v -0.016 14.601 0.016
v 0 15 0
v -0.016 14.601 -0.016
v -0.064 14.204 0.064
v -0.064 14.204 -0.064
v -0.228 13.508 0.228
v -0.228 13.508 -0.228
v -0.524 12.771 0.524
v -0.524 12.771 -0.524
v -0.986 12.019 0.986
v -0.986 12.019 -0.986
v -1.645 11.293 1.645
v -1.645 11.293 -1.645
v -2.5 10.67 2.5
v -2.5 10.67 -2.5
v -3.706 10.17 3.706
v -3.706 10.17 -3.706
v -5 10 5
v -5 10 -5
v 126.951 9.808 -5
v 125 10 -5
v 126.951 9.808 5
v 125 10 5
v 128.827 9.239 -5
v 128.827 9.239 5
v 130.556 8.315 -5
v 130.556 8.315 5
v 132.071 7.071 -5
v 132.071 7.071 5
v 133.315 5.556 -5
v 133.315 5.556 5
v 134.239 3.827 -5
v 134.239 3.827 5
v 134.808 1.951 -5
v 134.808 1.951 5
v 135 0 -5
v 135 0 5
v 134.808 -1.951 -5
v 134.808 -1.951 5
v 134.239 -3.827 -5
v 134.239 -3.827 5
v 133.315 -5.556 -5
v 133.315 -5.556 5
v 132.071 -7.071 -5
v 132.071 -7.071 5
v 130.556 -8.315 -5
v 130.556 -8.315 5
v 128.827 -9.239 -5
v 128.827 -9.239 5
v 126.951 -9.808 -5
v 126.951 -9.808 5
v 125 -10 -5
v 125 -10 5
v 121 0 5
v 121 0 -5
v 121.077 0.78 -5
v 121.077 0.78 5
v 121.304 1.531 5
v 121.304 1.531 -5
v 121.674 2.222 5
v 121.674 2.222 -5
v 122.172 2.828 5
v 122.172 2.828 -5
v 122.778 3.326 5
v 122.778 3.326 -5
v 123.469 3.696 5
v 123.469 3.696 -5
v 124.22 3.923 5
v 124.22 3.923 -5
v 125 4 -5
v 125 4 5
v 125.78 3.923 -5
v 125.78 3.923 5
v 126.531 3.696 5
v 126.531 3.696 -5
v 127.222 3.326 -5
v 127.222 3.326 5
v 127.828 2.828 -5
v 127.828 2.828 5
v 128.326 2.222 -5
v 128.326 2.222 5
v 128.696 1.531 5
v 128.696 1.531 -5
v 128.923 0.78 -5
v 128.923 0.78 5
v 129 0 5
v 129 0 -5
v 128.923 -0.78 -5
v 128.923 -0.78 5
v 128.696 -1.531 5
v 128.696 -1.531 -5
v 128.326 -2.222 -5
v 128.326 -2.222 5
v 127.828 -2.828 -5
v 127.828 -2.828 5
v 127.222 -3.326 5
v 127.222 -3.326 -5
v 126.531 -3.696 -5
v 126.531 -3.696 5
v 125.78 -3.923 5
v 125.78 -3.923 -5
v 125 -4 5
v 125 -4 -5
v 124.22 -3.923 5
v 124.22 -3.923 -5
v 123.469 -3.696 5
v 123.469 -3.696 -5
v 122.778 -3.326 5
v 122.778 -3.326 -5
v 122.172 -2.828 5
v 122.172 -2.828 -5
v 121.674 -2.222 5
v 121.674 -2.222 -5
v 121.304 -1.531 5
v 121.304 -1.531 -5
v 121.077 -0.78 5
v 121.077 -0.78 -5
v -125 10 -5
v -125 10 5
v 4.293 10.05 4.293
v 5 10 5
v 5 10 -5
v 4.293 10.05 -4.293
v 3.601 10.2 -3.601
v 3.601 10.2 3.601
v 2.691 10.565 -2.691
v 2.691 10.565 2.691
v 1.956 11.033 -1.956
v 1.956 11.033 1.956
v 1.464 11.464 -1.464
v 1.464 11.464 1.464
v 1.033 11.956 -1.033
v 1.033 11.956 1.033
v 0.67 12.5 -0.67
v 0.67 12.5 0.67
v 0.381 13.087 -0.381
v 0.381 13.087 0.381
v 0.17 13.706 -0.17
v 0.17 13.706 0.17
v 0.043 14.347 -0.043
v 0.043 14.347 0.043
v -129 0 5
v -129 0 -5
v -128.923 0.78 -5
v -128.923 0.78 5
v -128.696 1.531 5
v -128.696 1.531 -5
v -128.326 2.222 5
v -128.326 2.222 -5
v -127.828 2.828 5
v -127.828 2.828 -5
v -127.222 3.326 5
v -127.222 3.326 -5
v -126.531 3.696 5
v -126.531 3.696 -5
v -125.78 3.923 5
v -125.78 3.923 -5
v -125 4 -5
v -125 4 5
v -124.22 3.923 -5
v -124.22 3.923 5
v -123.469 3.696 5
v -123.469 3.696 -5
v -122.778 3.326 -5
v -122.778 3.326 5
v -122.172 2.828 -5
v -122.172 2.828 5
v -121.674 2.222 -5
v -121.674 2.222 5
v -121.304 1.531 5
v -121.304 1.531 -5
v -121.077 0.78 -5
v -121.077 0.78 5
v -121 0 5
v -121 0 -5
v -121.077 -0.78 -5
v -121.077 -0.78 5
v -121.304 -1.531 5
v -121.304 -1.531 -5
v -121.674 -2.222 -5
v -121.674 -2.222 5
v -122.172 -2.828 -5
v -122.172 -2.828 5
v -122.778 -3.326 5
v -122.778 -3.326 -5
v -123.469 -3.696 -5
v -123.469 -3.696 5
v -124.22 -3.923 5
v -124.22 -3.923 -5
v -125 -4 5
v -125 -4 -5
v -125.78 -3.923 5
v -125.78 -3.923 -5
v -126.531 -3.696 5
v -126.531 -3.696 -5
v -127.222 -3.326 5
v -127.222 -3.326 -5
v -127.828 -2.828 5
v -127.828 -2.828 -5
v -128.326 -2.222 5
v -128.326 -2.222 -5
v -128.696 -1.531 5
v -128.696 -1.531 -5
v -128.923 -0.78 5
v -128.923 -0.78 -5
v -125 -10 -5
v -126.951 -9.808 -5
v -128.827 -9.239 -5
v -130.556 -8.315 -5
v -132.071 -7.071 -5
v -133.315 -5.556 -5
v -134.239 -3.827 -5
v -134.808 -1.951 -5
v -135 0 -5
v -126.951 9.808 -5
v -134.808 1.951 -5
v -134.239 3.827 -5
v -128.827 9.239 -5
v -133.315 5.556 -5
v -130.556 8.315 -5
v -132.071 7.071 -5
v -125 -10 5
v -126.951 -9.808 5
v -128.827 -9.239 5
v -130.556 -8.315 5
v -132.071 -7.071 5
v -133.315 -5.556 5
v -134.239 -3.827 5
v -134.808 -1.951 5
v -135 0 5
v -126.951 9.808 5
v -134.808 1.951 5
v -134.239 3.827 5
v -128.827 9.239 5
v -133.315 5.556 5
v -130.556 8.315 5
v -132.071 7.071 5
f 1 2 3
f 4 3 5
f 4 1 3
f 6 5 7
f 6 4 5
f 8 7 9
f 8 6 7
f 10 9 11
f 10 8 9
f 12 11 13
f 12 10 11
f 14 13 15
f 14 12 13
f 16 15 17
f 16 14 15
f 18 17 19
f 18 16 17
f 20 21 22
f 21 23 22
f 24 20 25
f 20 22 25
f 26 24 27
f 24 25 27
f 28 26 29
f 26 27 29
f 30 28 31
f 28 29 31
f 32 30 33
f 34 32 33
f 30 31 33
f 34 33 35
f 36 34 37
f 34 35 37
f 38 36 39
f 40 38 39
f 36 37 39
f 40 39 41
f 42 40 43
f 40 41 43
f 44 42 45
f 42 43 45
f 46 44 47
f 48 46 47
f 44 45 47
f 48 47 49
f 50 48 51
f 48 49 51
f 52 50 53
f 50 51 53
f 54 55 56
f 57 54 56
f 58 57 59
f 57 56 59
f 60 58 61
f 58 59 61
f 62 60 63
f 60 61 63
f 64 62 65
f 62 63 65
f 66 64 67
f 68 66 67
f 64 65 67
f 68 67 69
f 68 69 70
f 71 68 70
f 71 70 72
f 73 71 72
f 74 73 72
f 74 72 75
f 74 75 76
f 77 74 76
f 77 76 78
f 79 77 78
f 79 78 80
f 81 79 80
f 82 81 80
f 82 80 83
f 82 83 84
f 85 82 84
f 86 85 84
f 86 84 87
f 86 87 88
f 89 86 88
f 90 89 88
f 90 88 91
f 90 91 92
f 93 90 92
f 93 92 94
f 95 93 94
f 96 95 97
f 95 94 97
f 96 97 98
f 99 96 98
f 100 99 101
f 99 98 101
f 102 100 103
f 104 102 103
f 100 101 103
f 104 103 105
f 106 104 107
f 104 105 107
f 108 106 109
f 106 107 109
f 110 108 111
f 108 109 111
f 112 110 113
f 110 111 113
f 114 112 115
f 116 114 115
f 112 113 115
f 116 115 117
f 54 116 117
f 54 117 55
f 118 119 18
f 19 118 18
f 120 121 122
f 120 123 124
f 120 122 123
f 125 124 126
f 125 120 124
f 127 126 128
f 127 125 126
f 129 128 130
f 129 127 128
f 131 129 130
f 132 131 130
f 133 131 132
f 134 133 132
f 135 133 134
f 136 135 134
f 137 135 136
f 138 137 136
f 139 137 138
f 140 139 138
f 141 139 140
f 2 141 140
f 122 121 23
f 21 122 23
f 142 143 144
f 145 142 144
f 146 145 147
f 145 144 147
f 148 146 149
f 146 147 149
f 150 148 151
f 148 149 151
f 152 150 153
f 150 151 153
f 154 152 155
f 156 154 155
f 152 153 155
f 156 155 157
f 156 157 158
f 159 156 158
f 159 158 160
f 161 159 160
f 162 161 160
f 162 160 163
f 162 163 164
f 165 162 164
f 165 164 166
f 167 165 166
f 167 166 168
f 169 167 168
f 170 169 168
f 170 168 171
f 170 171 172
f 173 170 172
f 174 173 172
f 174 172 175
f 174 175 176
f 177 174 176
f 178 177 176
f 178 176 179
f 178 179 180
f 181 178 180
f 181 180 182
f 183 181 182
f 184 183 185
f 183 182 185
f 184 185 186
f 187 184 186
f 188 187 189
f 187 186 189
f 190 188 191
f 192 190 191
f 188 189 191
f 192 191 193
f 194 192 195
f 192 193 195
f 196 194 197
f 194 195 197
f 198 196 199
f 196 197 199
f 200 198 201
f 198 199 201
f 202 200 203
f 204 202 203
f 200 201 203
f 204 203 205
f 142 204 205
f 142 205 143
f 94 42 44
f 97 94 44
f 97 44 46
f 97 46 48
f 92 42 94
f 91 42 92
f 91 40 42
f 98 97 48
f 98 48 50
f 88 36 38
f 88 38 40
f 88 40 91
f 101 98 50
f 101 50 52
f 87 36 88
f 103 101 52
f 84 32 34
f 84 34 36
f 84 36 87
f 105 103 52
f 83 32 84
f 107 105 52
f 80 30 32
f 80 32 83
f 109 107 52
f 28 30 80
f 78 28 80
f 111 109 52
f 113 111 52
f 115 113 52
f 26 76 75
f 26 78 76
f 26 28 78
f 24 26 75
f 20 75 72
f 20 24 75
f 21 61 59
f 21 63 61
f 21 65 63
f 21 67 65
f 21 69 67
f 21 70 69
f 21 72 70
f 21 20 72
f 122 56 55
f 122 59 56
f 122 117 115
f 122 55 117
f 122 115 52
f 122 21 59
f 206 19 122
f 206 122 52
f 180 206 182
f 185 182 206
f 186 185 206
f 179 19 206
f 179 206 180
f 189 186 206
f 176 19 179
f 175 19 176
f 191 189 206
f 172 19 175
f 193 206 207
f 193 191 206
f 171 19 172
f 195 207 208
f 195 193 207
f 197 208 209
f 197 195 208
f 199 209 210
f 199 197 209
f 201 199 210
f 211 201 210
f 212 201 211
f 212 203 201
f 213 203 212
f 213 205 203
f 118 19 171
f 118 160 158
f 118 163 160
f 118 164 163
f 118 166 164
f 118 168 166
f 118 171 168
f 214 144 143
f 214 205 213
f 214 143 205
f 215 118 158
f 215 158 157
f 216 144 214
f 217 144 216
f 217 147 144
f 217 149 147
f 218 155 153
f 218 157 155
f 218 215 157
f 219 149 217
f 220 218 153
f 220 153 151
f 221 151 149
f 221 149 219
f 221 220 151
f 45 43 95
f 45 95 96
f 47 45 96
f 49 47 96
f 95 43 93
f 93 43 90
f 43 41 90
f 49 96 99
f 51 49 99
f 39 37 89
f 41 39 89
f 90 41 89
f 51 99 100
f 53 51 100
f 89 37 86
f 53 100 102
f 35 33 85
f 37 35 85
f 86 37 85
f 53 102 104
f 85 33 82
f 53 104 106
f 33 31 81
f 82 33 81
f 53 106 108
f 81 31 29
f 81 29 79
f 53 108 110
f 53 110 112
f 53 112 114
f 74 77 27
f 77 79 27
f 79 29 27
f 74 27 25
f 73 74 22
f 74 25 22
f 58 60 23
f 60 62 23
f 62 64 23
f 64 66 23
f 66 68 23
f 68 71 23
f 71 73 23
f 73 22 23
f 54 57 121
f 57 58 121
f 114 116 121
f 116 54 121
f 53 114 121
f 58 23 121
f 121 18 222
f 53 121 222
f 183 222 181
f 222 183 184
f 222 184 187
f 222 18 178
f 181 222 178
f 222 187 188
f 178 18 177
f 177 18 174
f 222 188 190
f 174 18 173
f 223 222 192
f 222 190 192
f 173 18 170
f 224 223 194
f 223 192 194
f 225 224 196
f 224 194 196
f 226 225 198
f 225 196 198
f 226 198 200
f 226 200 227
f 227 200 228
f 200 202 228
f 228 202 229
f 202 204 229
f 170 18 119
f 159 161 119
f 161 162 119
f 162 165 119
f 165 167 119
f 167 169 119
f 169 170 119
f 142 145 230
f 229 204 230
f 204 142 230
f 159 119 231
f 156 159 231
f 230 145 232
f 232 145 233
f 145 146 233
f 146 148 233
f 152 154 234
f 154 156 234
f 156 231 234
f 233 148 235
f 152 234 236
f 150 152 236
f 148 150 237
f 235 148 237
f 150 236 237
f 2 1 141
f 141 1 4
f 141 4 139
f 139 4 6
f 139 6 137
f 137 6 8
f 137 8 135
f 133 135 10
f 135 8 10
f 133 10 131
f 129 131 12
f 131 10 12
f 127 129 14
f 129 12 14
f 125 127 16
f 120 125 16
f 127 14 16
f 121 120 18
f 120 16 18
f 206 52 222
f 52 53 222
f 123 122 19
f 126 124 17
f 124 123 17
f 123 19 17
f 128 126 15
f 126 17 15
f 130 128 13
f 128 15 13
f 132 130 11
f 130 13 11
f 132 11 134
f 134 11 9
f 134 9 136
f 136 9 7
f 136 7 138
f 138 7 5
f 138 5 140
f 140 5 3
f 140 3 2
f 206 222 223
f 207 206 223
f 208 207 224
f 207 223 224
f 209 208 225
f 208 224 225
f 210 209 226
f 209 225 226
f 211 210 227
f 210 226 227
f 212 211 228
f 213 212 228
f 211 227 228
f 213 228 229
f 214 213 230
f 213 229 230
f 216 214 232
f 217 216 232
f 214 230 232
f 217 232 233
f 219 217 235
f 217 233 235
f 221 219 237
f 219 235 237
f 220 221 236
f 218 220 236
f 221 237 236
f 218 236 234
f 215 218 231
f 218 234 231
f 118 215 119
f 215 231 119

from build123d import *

# Parameters (mm, degrees)
BOSS_EXTRUDE1_DEPTH     = 5
F_8_0MM_DOWEL_HOLE1_D   = 8
BOSS_EXTRUDE2_DEPTH     = 10
CUT_EXTRUDE1_DEPTH      = 136.922772191
CUT_EXTRUDE1_DEPTH_BACK = 136.922772191


with BuildPart() as part:
    # Sketch1 → Boss-Extrude1 (new, symmetric)
    with BuildSketch(Plane.XY):
        with BuildLine():
            Line((-125, 10), (125, 10))
            ThreePointArc((125, 10), (135, 0), (125, -10))
            Line((125, -10), (-125, -10))
            ThreePointArc((-125, -10), (-135, 0), (-125, 10))
        make_face()
    extrude(amount=BOSS_EXTRUDE1_DEPTH, both=True)

    # Ø8.0mm Dowel Hole1 (through all)
    with Locations(Plane.XY.offset(5)):
        with Locations((-125, 0), (125, 0)):
            Hole(F_8_0MM_DOWEL_HOLE1_D / 2)

    # Sketch4 → Boss-Extrude2 (add)
    with BuildSketch(Plane.XY.offset(5)):
        with BuildLine():
            Line((-5, 10), (5, 10))
            ThreePointArc((5, 10), (1.464466094, 11.464466094), (0, 15))
            ThreePointArc((0, 15), (-1.464466094, 11.464466094), (-5, 10))
        make_face()
    extrude(amount=-BOSS_EXTRUDE2_DEPTH)

    # Sketch5 → Cut-Extrude1 (cut, two sides: drawn at the far end of the back side and taken through both)
    with BuildSketch(Plane(origin=(0, 0, 0), x_dir=(0, 0, -1), z_dir=(1, 0, 0)).offset(-CUT_EXTRUDE1_DEPTH_BACK)):
        with BuildLine():
            Line((-5, 10), (-5, 20))
            Line((-5, 20), (5, 20))
            Line((5, 20), (5, 10))
            ThreePointArc((5, 10), (1.464466094, 11.464466094), (0, 15))
            ThreePointArc((0, 15), (-1.464466094, 11.464466094), (-5, 10))
        make_face()
    extrude(amount=CUT_EXTRUDE1_DEPTH + CUT_EXTRUDE1_DEPTH_BACK, mode=Mode.SUBTRACT)


solid = part.part
